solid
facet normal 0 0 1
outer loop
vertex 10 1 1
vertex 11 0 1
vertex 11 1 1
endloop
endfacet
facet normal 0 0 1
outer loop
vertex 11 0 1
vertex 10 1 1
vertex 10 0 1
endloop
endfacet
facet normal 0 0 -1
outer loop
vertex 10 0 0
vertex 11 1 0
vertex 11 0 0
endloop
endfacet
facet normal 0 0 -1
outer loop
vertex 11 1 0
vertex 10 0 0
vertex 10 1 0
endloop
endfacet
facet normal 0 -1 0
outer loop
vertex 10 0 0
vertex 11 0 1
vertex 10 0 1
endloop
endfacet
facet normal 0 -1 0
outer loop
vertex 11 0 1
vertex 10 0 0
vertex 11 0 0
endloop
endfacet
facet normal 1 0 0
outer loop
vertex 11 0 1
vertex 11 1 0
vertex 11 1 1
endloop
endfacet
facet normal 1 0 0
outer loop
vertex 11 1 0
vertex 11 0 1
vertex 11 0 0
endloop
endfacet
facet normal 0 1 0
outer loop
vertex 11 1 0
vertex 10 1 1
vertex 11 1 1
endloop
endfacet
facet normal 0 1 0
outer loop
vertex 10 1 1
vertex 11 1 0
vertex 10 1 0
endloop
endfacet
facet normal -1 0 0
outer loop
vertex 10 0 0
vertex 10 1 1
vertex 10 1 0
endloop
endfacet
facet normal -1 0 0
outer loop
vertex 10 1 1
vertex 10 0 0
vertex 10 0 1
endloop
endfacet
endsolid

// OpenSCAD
// Original CanvasNet test fixture: function literals and calls on arbitrary expressions.
double = function(x) x * 2;
add = function(a, b = 1) a + b;
compose = function(f, g) function(x) f(g(x));
result = (function(x) x + 1)(41);
apply = function(fn, v) fn(v);
value = apply(function(n) n * n, 7);
curried = function(a) function(b) function(c) a + b + c;
sum3 = curried(1)(2)(3);
table = [function(x) x, function(x) x * x];
second = table[1](5);

module use_callback(cb) {
  translate([cb(1), 0, 0]) cube(1);
}

use_callback(function(t) t * 10);
